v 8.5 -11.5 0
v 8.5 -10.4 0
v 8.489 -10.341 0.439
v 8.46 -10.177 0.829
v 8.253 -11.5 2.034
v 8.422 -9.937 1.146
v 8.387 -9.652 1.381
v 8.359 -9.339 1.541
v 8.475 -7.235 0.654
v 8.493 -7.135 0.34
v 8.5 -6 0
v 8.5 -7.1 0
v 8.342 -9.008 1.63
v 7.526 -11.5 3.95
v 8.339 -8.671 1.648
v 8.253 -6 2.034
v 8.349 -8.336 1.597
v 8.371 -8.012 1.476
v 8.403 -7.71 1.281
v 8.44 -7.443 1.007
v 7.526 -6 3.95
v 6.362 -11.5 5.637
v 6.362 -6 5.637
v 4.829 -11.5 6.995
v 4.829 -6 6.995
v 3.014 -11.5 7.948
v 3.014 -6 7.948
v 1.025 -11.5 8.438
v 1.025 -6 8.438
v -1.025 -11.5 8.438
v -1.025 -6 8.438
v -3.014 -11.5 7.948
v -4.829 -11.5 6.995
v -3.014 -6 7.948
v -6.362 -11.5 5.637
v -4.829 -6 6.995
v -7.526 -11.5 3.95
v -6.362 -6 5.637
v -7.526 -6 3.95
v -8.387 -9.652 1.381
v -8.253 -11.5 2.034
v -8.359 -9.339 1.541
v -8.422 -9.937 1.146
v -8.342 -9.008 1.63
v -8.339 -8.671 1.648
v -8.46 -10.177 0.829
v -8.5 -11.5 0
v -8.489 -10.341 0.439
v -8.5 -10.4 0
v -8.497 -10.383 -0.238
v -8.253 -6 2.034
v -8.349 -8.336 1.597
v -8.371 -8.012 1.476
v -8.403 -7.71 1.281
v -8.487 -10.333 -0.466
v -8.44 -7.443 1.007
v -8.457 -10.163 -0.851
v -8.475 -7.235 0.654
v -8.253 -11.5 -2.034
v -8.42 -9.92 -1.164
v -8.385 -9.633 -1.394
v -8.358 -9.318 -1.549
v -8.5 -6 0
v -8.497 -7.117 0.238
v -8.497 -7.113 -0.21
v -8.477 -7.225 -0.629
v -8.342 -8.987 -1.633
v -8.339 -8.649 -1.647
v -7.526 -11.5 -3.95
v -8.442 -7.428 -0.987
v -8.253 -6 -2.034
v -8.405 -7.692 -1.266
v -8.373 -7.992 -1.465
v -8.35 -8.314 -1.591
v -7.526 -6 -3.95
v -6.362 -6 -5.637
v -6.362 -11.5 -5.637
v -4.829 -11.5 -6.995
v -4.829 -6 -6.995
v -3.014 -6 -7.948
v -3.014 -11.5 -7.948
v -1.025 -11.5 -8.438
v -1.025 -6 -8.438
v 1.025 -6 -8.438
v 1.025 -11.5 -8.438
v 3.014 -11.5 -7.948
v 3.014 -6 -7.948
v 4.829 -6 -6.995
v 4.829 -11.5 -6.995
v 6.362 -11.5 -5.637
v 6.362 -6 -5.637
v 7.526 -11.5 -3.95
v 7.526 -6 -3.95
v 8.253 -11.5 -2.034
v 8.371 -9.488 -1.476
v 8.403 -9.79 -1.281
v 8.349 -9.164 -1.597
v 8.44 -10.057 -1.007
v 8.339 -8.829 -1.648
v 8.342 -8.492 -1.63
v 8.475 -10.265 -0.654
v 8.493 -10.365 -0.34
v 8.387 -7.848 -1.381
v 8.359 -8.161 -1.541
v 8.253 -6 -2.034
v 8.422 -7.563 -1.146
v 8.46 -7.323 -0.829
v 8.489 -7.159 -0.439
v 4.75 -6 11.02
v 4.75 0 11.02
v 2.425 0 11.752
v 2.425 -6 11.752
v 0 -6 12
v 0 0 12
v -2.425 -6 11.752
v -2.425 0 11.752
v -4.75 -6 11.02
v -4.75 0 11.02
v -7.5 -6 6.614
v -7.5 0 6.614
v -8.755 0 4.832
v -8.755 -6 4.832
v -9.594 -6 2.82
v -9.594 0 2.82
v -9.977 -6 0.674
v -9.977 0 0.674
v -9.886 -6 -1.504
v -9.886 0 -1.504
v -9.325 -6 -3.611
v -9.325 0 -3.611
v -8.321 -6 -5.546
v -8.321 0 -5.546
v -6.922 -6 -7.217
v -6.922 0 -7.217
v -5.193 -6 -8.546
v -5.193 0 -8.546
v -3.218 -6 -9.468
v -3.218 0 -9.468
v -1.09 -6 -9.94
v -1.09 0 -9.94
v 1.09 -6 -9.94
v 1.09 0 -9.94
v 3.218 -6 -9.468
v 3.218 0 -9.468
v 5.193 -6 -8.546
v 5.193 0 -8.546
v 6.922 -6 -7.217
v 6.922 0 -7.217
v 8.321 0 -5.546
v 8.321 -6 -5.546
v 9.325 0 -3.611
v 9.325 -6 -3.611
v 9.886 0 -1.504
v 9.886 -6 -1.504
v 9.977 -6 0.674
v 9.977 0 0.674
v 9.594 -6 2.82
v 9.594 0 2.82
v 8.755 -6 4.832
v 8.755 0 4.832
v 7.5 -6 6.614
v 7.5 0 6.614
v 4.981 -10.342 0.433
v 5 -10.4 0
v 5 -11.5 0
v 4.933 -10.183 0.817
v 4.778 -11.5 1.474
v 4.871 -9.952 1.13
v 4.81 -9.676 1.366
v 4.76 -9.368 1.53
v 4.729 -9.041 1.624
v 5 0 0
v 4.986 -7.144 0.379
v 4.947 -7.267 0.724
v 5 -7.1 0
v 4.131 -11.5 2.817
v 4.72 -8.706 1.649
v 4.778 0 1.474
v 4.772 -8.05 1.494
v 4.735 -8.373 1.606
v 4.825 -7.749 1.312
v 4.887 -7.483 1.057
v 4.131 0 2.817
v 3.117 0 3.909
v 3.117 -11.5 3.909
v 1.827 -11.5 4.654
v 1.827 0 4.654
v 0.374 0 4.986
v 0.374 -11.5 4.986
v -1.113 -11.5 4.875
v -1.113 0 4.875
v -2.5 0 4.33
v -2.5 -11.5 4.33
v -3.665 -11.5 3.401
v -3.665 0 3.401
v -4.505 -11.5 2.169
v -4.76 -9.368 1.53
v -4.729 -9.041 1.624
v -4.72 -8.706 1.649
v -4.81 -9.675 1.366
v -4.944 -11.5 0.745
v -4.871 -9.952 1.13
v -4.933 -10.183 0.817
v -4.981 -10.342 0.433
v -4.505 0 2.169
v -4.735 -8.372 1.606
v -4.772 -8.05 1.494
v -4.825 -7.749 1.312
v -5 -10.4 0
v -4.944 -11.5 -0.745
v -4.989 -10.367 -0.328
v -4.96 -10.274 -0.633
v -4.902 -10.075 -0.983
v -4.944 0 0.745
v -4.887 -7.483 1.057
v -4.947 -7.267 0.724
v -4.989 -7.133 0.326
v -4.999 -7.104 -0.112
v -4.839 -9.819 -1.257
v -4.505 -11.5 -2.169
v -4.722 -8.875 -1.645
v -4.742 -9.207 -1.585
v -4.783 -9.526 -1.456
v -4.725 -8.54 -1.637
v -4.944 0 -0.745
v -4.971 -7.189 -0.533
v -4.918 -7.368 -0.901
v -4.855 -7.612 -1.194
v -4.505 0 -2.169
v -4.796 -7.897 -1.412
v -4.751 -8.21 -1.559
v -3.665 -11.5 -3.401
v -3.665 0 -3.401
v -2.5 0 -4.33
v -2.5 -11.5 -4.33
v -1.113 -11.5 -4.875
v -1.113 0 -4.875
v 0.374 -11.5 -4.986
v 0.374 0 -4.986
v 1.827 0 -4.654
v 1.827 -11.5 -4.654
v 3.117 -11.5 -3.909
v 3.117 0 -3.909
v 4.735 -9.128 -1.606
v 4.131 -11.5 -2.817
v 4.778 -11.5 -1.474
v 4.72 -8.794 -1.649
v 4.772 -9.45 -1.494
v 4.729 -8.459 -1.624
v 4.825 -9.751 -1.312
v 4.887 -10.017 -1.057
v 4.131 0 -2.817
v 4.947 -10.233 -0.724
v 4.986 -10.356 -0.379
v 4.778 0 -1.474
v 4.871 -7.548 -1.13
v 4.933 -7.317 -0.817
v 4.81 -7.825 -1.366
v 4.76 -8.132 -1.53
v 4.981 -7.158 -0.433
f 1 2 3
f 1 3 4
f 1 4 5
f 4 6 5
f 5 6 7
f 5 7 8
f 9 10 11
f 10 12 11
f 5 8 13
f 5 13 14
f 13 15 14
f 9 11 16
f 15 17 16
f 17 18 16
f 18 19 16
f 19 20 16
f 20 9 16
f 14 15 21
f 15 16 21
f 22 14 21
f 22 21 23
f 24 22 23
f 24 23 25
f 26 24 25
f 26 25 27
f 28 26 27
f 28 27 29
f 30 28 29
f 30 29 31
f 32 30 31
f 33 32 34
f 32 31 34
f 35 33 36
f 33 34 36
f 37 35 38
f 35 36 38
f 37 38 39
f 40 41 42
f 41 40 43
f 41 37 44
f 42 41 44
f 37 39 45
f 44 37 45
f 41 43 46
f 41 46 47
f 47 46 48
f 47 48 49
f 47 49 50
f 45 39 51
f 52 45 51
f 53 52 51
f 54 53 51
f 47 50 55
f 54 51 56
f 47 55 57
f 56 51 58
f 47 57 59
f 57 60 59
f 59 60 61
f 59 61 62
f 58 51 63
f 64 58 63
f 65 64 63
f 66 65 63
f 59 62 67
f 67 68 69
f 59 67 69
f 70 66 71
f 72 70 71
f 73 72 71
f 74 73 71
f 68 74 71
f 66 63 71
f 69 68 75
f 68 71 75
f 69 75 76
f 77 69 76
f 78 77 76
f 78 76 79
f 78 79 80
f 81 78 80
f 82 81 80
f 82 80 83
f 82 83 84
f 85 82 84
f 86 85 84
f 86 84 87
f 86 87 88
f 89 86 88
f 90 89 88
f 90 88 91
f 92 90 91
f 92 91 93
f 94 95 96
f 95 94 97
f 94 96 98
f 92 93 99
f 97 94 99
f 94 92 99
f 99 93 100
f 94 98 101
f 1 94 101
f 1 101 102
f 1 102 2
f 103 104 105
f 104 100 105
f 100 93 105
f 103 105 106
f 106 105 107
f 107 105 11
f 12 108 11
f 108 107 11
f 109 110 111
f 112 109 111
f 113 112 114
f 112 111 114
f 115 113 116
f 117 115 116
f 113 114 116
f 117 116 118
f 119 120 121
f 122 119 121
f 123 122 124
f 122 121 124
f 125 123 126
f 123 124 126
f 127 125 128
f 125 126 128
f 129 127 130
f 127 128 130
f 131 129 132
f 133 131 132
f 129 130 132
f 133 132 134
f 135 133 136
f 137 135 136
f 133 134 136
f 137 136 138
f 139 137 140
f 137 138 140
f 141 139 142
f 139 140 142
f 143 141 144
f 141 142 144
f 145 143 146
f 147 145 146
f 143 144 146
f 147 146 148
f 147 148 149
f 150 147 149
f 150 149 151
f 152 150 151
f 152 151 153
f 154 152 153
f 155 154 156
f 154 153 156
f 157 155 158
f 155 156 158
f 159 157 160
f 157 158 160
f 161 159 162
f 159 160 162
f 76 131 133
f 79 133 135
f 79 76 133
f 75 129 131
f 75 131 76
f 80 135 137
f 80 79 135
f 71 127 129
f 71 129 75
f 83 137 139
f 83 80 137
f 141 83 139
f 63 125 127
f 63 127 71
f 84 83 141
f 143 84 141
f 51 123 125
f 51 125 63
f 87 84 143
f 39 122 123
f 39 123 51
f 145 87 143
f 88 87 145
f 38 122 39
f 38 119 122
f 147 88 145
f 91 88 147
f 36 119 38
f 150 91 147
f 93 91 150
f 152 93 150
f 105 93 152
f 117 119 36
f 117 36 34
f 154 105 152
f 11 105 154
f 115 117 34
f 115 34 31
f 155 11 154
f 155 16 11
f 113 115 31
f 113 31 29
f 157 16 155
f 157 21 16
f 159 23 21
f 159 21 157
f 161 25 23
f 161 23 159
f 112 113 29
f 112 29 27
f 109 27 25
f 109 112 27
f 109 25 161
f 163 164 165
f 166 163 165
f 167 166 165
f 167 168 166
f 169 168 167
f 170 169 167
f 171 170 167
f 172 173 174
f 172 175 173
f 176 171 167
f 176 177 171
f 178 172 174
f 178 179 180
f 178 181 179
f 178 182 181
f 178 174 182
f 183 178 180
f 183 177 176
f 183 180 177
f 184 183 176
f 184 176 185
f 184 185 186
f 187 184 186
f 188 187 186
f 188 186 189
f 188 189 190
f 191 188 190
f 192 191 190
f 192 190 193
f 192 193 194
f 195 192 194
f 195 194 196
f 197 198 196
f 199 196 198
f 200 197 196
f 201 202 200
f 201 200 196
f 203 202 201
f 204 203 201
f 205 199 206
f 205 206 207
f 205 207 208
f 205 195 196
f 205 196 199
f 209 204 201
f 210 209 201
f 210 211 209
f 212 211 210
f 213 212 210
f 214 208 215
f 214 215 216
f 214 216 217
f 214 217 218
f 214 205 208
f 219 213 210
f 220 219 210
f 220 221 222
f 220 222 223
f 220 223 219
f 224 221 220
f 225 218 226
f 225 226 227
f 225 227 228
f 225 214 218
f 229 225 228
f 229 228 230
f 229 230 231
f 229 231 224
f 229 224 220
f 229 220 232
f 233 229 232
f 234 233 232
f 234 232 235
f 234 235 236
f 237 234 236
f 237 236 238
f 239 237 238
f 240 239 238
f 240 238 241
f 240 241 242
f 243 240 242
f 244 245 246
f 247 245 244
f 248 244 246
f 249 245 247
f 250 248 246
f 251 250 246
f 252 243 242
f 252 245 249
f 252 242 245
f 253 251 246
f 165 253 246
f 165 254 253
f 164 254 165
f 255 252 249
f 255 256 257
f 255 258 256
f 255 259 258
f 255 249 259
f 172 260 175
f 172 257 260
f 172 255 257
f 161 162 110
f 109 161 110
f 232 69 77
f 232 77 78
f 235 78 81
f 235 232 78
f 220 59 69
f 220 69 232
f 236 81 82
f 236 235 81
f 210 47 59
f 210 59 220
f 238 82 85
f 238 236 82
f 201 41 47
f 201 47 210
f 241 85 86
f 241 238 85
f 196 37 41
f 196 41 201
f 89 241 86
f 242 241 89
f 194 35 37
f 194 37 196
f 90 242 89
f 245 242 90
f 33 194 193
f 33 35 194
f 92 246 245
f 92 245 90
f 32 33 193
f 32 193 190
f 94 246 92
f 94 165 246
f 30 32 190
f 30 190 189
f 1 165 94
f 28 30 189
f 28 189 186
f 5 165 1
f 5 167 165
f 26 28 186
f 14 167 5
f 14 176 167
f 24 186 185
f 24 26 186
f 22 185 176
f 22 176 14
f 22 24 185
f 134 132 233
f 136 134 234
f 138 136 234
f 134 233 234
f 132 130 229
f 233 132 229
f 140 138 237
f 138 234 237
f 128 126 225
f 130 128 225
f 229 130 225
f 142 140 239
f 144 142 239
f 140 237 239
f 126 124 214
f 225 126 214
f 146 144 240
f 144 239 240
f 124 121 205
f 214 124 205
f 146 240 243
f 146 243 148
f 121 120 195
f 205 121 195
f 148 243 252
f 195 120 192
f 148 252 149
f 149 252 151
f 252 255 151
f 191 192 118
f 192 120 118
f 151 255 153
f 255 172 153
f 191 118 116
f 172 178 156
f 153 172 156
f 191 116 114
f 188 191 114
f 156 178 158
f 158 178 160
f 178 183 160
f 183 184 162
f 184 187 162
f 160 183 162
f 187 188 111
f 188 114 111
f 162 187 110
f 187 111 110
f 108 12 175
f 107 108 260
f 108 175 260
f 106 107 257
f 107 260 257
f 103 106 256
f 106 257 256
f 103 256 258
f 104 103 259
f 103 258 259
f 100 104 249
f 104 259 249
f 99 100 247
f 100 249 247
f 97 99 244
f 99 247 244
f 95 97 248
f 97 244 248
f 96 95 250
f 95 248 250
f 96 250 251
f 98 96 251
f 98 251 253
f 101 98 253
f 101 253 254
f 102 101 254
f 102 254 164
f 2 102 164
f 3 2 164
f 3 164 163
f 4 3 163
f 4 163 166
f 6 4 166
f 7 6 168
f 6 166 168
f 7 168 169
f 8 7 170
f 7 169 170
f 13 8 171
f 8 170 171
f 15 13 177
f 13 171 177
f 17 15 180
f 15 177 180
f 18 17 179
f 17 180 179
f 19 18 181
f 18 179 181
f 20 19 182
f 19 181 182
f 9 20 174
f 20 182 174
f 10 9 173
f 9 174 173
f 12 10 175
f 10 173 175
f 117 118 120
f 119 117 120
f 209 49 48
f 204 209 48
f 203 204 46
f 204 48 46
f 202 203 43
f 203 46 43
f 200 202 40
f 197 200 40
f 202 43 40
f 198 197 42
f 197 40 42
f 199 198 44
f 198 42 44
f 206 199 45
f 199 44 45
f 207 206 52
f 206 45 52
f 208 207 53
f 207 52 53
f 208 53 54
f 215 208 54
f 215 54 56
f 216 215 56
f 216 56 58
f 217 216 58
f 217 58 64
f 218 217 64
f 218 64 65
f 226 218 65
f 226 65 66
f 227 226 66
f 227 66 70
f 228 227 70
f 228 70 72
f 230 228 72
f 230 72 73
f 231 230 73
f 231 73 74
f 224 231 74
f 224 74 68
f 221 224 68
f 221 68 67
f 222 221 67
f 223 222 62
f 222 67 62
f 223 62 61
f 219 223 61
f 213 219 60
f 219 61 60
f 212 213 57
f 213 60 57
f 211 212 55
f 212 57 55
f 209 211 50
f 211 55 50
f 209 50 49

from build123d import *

# Parameters (mm, degrees)
F0_R     = 8.5
F0_R_2   = 5
F1_DEPTH = 6
F2_DEPTH = 11.5
F4_D     = 3.3
F4_DEPTH = 10.001
F5_D     = 3.3


with BuildPart() as f1:
    # F0 (on Front) → F1 (new body)
    with BuildSketch(Plane.XZ):
        with BuildLine():
            Line((-4.75, 11.0198684203), (-7.5, 6.6143782777))
            ThreePointArc((-7.5, 6.6143782777), (0, -10), (7.5, 6.6143782777))
            Line((7.5, 6.6143782777), (4.75, 11.0198684203))
            ThreePointArc((4.75, 11.0198684203), (0, 12), (-4.75, 11.0198684203))
        make_face()
        Circle(F0_R, mode=Mode.SUBTRACT)
        Circle(F0_R)
        Circle(F0_R_2, mode=Mode.SUBTRACT)
    extrude(amount=F1_DEPTH)

    # F0 (on Front) → F2 (join)
    with BuildSketch(Plane.XZ):
        Circle(F0_R)
        Circle(F0_R_2, mode=Mode.SUBTRACT)
    extrude(amount=F2_DEPTH)

    # F4 (through all, one way)
    with BuildSketch(Plane(origin=(0, 0, 0), x_dir=(0, 1, 0), z_dir=(-1, 0, 0))):
        with Locations((-8.75, 0)):
            Circle(F4_D / 2)
    extrude(amount=-F4_DEPTH, mode=Mode.SUBTRACT)

    # F5 (through all)
    with Locations(Plane.YZ):
        with Locations((-8.75, 0)):
            Hole(F5_D / 2)


solid = f1.part
